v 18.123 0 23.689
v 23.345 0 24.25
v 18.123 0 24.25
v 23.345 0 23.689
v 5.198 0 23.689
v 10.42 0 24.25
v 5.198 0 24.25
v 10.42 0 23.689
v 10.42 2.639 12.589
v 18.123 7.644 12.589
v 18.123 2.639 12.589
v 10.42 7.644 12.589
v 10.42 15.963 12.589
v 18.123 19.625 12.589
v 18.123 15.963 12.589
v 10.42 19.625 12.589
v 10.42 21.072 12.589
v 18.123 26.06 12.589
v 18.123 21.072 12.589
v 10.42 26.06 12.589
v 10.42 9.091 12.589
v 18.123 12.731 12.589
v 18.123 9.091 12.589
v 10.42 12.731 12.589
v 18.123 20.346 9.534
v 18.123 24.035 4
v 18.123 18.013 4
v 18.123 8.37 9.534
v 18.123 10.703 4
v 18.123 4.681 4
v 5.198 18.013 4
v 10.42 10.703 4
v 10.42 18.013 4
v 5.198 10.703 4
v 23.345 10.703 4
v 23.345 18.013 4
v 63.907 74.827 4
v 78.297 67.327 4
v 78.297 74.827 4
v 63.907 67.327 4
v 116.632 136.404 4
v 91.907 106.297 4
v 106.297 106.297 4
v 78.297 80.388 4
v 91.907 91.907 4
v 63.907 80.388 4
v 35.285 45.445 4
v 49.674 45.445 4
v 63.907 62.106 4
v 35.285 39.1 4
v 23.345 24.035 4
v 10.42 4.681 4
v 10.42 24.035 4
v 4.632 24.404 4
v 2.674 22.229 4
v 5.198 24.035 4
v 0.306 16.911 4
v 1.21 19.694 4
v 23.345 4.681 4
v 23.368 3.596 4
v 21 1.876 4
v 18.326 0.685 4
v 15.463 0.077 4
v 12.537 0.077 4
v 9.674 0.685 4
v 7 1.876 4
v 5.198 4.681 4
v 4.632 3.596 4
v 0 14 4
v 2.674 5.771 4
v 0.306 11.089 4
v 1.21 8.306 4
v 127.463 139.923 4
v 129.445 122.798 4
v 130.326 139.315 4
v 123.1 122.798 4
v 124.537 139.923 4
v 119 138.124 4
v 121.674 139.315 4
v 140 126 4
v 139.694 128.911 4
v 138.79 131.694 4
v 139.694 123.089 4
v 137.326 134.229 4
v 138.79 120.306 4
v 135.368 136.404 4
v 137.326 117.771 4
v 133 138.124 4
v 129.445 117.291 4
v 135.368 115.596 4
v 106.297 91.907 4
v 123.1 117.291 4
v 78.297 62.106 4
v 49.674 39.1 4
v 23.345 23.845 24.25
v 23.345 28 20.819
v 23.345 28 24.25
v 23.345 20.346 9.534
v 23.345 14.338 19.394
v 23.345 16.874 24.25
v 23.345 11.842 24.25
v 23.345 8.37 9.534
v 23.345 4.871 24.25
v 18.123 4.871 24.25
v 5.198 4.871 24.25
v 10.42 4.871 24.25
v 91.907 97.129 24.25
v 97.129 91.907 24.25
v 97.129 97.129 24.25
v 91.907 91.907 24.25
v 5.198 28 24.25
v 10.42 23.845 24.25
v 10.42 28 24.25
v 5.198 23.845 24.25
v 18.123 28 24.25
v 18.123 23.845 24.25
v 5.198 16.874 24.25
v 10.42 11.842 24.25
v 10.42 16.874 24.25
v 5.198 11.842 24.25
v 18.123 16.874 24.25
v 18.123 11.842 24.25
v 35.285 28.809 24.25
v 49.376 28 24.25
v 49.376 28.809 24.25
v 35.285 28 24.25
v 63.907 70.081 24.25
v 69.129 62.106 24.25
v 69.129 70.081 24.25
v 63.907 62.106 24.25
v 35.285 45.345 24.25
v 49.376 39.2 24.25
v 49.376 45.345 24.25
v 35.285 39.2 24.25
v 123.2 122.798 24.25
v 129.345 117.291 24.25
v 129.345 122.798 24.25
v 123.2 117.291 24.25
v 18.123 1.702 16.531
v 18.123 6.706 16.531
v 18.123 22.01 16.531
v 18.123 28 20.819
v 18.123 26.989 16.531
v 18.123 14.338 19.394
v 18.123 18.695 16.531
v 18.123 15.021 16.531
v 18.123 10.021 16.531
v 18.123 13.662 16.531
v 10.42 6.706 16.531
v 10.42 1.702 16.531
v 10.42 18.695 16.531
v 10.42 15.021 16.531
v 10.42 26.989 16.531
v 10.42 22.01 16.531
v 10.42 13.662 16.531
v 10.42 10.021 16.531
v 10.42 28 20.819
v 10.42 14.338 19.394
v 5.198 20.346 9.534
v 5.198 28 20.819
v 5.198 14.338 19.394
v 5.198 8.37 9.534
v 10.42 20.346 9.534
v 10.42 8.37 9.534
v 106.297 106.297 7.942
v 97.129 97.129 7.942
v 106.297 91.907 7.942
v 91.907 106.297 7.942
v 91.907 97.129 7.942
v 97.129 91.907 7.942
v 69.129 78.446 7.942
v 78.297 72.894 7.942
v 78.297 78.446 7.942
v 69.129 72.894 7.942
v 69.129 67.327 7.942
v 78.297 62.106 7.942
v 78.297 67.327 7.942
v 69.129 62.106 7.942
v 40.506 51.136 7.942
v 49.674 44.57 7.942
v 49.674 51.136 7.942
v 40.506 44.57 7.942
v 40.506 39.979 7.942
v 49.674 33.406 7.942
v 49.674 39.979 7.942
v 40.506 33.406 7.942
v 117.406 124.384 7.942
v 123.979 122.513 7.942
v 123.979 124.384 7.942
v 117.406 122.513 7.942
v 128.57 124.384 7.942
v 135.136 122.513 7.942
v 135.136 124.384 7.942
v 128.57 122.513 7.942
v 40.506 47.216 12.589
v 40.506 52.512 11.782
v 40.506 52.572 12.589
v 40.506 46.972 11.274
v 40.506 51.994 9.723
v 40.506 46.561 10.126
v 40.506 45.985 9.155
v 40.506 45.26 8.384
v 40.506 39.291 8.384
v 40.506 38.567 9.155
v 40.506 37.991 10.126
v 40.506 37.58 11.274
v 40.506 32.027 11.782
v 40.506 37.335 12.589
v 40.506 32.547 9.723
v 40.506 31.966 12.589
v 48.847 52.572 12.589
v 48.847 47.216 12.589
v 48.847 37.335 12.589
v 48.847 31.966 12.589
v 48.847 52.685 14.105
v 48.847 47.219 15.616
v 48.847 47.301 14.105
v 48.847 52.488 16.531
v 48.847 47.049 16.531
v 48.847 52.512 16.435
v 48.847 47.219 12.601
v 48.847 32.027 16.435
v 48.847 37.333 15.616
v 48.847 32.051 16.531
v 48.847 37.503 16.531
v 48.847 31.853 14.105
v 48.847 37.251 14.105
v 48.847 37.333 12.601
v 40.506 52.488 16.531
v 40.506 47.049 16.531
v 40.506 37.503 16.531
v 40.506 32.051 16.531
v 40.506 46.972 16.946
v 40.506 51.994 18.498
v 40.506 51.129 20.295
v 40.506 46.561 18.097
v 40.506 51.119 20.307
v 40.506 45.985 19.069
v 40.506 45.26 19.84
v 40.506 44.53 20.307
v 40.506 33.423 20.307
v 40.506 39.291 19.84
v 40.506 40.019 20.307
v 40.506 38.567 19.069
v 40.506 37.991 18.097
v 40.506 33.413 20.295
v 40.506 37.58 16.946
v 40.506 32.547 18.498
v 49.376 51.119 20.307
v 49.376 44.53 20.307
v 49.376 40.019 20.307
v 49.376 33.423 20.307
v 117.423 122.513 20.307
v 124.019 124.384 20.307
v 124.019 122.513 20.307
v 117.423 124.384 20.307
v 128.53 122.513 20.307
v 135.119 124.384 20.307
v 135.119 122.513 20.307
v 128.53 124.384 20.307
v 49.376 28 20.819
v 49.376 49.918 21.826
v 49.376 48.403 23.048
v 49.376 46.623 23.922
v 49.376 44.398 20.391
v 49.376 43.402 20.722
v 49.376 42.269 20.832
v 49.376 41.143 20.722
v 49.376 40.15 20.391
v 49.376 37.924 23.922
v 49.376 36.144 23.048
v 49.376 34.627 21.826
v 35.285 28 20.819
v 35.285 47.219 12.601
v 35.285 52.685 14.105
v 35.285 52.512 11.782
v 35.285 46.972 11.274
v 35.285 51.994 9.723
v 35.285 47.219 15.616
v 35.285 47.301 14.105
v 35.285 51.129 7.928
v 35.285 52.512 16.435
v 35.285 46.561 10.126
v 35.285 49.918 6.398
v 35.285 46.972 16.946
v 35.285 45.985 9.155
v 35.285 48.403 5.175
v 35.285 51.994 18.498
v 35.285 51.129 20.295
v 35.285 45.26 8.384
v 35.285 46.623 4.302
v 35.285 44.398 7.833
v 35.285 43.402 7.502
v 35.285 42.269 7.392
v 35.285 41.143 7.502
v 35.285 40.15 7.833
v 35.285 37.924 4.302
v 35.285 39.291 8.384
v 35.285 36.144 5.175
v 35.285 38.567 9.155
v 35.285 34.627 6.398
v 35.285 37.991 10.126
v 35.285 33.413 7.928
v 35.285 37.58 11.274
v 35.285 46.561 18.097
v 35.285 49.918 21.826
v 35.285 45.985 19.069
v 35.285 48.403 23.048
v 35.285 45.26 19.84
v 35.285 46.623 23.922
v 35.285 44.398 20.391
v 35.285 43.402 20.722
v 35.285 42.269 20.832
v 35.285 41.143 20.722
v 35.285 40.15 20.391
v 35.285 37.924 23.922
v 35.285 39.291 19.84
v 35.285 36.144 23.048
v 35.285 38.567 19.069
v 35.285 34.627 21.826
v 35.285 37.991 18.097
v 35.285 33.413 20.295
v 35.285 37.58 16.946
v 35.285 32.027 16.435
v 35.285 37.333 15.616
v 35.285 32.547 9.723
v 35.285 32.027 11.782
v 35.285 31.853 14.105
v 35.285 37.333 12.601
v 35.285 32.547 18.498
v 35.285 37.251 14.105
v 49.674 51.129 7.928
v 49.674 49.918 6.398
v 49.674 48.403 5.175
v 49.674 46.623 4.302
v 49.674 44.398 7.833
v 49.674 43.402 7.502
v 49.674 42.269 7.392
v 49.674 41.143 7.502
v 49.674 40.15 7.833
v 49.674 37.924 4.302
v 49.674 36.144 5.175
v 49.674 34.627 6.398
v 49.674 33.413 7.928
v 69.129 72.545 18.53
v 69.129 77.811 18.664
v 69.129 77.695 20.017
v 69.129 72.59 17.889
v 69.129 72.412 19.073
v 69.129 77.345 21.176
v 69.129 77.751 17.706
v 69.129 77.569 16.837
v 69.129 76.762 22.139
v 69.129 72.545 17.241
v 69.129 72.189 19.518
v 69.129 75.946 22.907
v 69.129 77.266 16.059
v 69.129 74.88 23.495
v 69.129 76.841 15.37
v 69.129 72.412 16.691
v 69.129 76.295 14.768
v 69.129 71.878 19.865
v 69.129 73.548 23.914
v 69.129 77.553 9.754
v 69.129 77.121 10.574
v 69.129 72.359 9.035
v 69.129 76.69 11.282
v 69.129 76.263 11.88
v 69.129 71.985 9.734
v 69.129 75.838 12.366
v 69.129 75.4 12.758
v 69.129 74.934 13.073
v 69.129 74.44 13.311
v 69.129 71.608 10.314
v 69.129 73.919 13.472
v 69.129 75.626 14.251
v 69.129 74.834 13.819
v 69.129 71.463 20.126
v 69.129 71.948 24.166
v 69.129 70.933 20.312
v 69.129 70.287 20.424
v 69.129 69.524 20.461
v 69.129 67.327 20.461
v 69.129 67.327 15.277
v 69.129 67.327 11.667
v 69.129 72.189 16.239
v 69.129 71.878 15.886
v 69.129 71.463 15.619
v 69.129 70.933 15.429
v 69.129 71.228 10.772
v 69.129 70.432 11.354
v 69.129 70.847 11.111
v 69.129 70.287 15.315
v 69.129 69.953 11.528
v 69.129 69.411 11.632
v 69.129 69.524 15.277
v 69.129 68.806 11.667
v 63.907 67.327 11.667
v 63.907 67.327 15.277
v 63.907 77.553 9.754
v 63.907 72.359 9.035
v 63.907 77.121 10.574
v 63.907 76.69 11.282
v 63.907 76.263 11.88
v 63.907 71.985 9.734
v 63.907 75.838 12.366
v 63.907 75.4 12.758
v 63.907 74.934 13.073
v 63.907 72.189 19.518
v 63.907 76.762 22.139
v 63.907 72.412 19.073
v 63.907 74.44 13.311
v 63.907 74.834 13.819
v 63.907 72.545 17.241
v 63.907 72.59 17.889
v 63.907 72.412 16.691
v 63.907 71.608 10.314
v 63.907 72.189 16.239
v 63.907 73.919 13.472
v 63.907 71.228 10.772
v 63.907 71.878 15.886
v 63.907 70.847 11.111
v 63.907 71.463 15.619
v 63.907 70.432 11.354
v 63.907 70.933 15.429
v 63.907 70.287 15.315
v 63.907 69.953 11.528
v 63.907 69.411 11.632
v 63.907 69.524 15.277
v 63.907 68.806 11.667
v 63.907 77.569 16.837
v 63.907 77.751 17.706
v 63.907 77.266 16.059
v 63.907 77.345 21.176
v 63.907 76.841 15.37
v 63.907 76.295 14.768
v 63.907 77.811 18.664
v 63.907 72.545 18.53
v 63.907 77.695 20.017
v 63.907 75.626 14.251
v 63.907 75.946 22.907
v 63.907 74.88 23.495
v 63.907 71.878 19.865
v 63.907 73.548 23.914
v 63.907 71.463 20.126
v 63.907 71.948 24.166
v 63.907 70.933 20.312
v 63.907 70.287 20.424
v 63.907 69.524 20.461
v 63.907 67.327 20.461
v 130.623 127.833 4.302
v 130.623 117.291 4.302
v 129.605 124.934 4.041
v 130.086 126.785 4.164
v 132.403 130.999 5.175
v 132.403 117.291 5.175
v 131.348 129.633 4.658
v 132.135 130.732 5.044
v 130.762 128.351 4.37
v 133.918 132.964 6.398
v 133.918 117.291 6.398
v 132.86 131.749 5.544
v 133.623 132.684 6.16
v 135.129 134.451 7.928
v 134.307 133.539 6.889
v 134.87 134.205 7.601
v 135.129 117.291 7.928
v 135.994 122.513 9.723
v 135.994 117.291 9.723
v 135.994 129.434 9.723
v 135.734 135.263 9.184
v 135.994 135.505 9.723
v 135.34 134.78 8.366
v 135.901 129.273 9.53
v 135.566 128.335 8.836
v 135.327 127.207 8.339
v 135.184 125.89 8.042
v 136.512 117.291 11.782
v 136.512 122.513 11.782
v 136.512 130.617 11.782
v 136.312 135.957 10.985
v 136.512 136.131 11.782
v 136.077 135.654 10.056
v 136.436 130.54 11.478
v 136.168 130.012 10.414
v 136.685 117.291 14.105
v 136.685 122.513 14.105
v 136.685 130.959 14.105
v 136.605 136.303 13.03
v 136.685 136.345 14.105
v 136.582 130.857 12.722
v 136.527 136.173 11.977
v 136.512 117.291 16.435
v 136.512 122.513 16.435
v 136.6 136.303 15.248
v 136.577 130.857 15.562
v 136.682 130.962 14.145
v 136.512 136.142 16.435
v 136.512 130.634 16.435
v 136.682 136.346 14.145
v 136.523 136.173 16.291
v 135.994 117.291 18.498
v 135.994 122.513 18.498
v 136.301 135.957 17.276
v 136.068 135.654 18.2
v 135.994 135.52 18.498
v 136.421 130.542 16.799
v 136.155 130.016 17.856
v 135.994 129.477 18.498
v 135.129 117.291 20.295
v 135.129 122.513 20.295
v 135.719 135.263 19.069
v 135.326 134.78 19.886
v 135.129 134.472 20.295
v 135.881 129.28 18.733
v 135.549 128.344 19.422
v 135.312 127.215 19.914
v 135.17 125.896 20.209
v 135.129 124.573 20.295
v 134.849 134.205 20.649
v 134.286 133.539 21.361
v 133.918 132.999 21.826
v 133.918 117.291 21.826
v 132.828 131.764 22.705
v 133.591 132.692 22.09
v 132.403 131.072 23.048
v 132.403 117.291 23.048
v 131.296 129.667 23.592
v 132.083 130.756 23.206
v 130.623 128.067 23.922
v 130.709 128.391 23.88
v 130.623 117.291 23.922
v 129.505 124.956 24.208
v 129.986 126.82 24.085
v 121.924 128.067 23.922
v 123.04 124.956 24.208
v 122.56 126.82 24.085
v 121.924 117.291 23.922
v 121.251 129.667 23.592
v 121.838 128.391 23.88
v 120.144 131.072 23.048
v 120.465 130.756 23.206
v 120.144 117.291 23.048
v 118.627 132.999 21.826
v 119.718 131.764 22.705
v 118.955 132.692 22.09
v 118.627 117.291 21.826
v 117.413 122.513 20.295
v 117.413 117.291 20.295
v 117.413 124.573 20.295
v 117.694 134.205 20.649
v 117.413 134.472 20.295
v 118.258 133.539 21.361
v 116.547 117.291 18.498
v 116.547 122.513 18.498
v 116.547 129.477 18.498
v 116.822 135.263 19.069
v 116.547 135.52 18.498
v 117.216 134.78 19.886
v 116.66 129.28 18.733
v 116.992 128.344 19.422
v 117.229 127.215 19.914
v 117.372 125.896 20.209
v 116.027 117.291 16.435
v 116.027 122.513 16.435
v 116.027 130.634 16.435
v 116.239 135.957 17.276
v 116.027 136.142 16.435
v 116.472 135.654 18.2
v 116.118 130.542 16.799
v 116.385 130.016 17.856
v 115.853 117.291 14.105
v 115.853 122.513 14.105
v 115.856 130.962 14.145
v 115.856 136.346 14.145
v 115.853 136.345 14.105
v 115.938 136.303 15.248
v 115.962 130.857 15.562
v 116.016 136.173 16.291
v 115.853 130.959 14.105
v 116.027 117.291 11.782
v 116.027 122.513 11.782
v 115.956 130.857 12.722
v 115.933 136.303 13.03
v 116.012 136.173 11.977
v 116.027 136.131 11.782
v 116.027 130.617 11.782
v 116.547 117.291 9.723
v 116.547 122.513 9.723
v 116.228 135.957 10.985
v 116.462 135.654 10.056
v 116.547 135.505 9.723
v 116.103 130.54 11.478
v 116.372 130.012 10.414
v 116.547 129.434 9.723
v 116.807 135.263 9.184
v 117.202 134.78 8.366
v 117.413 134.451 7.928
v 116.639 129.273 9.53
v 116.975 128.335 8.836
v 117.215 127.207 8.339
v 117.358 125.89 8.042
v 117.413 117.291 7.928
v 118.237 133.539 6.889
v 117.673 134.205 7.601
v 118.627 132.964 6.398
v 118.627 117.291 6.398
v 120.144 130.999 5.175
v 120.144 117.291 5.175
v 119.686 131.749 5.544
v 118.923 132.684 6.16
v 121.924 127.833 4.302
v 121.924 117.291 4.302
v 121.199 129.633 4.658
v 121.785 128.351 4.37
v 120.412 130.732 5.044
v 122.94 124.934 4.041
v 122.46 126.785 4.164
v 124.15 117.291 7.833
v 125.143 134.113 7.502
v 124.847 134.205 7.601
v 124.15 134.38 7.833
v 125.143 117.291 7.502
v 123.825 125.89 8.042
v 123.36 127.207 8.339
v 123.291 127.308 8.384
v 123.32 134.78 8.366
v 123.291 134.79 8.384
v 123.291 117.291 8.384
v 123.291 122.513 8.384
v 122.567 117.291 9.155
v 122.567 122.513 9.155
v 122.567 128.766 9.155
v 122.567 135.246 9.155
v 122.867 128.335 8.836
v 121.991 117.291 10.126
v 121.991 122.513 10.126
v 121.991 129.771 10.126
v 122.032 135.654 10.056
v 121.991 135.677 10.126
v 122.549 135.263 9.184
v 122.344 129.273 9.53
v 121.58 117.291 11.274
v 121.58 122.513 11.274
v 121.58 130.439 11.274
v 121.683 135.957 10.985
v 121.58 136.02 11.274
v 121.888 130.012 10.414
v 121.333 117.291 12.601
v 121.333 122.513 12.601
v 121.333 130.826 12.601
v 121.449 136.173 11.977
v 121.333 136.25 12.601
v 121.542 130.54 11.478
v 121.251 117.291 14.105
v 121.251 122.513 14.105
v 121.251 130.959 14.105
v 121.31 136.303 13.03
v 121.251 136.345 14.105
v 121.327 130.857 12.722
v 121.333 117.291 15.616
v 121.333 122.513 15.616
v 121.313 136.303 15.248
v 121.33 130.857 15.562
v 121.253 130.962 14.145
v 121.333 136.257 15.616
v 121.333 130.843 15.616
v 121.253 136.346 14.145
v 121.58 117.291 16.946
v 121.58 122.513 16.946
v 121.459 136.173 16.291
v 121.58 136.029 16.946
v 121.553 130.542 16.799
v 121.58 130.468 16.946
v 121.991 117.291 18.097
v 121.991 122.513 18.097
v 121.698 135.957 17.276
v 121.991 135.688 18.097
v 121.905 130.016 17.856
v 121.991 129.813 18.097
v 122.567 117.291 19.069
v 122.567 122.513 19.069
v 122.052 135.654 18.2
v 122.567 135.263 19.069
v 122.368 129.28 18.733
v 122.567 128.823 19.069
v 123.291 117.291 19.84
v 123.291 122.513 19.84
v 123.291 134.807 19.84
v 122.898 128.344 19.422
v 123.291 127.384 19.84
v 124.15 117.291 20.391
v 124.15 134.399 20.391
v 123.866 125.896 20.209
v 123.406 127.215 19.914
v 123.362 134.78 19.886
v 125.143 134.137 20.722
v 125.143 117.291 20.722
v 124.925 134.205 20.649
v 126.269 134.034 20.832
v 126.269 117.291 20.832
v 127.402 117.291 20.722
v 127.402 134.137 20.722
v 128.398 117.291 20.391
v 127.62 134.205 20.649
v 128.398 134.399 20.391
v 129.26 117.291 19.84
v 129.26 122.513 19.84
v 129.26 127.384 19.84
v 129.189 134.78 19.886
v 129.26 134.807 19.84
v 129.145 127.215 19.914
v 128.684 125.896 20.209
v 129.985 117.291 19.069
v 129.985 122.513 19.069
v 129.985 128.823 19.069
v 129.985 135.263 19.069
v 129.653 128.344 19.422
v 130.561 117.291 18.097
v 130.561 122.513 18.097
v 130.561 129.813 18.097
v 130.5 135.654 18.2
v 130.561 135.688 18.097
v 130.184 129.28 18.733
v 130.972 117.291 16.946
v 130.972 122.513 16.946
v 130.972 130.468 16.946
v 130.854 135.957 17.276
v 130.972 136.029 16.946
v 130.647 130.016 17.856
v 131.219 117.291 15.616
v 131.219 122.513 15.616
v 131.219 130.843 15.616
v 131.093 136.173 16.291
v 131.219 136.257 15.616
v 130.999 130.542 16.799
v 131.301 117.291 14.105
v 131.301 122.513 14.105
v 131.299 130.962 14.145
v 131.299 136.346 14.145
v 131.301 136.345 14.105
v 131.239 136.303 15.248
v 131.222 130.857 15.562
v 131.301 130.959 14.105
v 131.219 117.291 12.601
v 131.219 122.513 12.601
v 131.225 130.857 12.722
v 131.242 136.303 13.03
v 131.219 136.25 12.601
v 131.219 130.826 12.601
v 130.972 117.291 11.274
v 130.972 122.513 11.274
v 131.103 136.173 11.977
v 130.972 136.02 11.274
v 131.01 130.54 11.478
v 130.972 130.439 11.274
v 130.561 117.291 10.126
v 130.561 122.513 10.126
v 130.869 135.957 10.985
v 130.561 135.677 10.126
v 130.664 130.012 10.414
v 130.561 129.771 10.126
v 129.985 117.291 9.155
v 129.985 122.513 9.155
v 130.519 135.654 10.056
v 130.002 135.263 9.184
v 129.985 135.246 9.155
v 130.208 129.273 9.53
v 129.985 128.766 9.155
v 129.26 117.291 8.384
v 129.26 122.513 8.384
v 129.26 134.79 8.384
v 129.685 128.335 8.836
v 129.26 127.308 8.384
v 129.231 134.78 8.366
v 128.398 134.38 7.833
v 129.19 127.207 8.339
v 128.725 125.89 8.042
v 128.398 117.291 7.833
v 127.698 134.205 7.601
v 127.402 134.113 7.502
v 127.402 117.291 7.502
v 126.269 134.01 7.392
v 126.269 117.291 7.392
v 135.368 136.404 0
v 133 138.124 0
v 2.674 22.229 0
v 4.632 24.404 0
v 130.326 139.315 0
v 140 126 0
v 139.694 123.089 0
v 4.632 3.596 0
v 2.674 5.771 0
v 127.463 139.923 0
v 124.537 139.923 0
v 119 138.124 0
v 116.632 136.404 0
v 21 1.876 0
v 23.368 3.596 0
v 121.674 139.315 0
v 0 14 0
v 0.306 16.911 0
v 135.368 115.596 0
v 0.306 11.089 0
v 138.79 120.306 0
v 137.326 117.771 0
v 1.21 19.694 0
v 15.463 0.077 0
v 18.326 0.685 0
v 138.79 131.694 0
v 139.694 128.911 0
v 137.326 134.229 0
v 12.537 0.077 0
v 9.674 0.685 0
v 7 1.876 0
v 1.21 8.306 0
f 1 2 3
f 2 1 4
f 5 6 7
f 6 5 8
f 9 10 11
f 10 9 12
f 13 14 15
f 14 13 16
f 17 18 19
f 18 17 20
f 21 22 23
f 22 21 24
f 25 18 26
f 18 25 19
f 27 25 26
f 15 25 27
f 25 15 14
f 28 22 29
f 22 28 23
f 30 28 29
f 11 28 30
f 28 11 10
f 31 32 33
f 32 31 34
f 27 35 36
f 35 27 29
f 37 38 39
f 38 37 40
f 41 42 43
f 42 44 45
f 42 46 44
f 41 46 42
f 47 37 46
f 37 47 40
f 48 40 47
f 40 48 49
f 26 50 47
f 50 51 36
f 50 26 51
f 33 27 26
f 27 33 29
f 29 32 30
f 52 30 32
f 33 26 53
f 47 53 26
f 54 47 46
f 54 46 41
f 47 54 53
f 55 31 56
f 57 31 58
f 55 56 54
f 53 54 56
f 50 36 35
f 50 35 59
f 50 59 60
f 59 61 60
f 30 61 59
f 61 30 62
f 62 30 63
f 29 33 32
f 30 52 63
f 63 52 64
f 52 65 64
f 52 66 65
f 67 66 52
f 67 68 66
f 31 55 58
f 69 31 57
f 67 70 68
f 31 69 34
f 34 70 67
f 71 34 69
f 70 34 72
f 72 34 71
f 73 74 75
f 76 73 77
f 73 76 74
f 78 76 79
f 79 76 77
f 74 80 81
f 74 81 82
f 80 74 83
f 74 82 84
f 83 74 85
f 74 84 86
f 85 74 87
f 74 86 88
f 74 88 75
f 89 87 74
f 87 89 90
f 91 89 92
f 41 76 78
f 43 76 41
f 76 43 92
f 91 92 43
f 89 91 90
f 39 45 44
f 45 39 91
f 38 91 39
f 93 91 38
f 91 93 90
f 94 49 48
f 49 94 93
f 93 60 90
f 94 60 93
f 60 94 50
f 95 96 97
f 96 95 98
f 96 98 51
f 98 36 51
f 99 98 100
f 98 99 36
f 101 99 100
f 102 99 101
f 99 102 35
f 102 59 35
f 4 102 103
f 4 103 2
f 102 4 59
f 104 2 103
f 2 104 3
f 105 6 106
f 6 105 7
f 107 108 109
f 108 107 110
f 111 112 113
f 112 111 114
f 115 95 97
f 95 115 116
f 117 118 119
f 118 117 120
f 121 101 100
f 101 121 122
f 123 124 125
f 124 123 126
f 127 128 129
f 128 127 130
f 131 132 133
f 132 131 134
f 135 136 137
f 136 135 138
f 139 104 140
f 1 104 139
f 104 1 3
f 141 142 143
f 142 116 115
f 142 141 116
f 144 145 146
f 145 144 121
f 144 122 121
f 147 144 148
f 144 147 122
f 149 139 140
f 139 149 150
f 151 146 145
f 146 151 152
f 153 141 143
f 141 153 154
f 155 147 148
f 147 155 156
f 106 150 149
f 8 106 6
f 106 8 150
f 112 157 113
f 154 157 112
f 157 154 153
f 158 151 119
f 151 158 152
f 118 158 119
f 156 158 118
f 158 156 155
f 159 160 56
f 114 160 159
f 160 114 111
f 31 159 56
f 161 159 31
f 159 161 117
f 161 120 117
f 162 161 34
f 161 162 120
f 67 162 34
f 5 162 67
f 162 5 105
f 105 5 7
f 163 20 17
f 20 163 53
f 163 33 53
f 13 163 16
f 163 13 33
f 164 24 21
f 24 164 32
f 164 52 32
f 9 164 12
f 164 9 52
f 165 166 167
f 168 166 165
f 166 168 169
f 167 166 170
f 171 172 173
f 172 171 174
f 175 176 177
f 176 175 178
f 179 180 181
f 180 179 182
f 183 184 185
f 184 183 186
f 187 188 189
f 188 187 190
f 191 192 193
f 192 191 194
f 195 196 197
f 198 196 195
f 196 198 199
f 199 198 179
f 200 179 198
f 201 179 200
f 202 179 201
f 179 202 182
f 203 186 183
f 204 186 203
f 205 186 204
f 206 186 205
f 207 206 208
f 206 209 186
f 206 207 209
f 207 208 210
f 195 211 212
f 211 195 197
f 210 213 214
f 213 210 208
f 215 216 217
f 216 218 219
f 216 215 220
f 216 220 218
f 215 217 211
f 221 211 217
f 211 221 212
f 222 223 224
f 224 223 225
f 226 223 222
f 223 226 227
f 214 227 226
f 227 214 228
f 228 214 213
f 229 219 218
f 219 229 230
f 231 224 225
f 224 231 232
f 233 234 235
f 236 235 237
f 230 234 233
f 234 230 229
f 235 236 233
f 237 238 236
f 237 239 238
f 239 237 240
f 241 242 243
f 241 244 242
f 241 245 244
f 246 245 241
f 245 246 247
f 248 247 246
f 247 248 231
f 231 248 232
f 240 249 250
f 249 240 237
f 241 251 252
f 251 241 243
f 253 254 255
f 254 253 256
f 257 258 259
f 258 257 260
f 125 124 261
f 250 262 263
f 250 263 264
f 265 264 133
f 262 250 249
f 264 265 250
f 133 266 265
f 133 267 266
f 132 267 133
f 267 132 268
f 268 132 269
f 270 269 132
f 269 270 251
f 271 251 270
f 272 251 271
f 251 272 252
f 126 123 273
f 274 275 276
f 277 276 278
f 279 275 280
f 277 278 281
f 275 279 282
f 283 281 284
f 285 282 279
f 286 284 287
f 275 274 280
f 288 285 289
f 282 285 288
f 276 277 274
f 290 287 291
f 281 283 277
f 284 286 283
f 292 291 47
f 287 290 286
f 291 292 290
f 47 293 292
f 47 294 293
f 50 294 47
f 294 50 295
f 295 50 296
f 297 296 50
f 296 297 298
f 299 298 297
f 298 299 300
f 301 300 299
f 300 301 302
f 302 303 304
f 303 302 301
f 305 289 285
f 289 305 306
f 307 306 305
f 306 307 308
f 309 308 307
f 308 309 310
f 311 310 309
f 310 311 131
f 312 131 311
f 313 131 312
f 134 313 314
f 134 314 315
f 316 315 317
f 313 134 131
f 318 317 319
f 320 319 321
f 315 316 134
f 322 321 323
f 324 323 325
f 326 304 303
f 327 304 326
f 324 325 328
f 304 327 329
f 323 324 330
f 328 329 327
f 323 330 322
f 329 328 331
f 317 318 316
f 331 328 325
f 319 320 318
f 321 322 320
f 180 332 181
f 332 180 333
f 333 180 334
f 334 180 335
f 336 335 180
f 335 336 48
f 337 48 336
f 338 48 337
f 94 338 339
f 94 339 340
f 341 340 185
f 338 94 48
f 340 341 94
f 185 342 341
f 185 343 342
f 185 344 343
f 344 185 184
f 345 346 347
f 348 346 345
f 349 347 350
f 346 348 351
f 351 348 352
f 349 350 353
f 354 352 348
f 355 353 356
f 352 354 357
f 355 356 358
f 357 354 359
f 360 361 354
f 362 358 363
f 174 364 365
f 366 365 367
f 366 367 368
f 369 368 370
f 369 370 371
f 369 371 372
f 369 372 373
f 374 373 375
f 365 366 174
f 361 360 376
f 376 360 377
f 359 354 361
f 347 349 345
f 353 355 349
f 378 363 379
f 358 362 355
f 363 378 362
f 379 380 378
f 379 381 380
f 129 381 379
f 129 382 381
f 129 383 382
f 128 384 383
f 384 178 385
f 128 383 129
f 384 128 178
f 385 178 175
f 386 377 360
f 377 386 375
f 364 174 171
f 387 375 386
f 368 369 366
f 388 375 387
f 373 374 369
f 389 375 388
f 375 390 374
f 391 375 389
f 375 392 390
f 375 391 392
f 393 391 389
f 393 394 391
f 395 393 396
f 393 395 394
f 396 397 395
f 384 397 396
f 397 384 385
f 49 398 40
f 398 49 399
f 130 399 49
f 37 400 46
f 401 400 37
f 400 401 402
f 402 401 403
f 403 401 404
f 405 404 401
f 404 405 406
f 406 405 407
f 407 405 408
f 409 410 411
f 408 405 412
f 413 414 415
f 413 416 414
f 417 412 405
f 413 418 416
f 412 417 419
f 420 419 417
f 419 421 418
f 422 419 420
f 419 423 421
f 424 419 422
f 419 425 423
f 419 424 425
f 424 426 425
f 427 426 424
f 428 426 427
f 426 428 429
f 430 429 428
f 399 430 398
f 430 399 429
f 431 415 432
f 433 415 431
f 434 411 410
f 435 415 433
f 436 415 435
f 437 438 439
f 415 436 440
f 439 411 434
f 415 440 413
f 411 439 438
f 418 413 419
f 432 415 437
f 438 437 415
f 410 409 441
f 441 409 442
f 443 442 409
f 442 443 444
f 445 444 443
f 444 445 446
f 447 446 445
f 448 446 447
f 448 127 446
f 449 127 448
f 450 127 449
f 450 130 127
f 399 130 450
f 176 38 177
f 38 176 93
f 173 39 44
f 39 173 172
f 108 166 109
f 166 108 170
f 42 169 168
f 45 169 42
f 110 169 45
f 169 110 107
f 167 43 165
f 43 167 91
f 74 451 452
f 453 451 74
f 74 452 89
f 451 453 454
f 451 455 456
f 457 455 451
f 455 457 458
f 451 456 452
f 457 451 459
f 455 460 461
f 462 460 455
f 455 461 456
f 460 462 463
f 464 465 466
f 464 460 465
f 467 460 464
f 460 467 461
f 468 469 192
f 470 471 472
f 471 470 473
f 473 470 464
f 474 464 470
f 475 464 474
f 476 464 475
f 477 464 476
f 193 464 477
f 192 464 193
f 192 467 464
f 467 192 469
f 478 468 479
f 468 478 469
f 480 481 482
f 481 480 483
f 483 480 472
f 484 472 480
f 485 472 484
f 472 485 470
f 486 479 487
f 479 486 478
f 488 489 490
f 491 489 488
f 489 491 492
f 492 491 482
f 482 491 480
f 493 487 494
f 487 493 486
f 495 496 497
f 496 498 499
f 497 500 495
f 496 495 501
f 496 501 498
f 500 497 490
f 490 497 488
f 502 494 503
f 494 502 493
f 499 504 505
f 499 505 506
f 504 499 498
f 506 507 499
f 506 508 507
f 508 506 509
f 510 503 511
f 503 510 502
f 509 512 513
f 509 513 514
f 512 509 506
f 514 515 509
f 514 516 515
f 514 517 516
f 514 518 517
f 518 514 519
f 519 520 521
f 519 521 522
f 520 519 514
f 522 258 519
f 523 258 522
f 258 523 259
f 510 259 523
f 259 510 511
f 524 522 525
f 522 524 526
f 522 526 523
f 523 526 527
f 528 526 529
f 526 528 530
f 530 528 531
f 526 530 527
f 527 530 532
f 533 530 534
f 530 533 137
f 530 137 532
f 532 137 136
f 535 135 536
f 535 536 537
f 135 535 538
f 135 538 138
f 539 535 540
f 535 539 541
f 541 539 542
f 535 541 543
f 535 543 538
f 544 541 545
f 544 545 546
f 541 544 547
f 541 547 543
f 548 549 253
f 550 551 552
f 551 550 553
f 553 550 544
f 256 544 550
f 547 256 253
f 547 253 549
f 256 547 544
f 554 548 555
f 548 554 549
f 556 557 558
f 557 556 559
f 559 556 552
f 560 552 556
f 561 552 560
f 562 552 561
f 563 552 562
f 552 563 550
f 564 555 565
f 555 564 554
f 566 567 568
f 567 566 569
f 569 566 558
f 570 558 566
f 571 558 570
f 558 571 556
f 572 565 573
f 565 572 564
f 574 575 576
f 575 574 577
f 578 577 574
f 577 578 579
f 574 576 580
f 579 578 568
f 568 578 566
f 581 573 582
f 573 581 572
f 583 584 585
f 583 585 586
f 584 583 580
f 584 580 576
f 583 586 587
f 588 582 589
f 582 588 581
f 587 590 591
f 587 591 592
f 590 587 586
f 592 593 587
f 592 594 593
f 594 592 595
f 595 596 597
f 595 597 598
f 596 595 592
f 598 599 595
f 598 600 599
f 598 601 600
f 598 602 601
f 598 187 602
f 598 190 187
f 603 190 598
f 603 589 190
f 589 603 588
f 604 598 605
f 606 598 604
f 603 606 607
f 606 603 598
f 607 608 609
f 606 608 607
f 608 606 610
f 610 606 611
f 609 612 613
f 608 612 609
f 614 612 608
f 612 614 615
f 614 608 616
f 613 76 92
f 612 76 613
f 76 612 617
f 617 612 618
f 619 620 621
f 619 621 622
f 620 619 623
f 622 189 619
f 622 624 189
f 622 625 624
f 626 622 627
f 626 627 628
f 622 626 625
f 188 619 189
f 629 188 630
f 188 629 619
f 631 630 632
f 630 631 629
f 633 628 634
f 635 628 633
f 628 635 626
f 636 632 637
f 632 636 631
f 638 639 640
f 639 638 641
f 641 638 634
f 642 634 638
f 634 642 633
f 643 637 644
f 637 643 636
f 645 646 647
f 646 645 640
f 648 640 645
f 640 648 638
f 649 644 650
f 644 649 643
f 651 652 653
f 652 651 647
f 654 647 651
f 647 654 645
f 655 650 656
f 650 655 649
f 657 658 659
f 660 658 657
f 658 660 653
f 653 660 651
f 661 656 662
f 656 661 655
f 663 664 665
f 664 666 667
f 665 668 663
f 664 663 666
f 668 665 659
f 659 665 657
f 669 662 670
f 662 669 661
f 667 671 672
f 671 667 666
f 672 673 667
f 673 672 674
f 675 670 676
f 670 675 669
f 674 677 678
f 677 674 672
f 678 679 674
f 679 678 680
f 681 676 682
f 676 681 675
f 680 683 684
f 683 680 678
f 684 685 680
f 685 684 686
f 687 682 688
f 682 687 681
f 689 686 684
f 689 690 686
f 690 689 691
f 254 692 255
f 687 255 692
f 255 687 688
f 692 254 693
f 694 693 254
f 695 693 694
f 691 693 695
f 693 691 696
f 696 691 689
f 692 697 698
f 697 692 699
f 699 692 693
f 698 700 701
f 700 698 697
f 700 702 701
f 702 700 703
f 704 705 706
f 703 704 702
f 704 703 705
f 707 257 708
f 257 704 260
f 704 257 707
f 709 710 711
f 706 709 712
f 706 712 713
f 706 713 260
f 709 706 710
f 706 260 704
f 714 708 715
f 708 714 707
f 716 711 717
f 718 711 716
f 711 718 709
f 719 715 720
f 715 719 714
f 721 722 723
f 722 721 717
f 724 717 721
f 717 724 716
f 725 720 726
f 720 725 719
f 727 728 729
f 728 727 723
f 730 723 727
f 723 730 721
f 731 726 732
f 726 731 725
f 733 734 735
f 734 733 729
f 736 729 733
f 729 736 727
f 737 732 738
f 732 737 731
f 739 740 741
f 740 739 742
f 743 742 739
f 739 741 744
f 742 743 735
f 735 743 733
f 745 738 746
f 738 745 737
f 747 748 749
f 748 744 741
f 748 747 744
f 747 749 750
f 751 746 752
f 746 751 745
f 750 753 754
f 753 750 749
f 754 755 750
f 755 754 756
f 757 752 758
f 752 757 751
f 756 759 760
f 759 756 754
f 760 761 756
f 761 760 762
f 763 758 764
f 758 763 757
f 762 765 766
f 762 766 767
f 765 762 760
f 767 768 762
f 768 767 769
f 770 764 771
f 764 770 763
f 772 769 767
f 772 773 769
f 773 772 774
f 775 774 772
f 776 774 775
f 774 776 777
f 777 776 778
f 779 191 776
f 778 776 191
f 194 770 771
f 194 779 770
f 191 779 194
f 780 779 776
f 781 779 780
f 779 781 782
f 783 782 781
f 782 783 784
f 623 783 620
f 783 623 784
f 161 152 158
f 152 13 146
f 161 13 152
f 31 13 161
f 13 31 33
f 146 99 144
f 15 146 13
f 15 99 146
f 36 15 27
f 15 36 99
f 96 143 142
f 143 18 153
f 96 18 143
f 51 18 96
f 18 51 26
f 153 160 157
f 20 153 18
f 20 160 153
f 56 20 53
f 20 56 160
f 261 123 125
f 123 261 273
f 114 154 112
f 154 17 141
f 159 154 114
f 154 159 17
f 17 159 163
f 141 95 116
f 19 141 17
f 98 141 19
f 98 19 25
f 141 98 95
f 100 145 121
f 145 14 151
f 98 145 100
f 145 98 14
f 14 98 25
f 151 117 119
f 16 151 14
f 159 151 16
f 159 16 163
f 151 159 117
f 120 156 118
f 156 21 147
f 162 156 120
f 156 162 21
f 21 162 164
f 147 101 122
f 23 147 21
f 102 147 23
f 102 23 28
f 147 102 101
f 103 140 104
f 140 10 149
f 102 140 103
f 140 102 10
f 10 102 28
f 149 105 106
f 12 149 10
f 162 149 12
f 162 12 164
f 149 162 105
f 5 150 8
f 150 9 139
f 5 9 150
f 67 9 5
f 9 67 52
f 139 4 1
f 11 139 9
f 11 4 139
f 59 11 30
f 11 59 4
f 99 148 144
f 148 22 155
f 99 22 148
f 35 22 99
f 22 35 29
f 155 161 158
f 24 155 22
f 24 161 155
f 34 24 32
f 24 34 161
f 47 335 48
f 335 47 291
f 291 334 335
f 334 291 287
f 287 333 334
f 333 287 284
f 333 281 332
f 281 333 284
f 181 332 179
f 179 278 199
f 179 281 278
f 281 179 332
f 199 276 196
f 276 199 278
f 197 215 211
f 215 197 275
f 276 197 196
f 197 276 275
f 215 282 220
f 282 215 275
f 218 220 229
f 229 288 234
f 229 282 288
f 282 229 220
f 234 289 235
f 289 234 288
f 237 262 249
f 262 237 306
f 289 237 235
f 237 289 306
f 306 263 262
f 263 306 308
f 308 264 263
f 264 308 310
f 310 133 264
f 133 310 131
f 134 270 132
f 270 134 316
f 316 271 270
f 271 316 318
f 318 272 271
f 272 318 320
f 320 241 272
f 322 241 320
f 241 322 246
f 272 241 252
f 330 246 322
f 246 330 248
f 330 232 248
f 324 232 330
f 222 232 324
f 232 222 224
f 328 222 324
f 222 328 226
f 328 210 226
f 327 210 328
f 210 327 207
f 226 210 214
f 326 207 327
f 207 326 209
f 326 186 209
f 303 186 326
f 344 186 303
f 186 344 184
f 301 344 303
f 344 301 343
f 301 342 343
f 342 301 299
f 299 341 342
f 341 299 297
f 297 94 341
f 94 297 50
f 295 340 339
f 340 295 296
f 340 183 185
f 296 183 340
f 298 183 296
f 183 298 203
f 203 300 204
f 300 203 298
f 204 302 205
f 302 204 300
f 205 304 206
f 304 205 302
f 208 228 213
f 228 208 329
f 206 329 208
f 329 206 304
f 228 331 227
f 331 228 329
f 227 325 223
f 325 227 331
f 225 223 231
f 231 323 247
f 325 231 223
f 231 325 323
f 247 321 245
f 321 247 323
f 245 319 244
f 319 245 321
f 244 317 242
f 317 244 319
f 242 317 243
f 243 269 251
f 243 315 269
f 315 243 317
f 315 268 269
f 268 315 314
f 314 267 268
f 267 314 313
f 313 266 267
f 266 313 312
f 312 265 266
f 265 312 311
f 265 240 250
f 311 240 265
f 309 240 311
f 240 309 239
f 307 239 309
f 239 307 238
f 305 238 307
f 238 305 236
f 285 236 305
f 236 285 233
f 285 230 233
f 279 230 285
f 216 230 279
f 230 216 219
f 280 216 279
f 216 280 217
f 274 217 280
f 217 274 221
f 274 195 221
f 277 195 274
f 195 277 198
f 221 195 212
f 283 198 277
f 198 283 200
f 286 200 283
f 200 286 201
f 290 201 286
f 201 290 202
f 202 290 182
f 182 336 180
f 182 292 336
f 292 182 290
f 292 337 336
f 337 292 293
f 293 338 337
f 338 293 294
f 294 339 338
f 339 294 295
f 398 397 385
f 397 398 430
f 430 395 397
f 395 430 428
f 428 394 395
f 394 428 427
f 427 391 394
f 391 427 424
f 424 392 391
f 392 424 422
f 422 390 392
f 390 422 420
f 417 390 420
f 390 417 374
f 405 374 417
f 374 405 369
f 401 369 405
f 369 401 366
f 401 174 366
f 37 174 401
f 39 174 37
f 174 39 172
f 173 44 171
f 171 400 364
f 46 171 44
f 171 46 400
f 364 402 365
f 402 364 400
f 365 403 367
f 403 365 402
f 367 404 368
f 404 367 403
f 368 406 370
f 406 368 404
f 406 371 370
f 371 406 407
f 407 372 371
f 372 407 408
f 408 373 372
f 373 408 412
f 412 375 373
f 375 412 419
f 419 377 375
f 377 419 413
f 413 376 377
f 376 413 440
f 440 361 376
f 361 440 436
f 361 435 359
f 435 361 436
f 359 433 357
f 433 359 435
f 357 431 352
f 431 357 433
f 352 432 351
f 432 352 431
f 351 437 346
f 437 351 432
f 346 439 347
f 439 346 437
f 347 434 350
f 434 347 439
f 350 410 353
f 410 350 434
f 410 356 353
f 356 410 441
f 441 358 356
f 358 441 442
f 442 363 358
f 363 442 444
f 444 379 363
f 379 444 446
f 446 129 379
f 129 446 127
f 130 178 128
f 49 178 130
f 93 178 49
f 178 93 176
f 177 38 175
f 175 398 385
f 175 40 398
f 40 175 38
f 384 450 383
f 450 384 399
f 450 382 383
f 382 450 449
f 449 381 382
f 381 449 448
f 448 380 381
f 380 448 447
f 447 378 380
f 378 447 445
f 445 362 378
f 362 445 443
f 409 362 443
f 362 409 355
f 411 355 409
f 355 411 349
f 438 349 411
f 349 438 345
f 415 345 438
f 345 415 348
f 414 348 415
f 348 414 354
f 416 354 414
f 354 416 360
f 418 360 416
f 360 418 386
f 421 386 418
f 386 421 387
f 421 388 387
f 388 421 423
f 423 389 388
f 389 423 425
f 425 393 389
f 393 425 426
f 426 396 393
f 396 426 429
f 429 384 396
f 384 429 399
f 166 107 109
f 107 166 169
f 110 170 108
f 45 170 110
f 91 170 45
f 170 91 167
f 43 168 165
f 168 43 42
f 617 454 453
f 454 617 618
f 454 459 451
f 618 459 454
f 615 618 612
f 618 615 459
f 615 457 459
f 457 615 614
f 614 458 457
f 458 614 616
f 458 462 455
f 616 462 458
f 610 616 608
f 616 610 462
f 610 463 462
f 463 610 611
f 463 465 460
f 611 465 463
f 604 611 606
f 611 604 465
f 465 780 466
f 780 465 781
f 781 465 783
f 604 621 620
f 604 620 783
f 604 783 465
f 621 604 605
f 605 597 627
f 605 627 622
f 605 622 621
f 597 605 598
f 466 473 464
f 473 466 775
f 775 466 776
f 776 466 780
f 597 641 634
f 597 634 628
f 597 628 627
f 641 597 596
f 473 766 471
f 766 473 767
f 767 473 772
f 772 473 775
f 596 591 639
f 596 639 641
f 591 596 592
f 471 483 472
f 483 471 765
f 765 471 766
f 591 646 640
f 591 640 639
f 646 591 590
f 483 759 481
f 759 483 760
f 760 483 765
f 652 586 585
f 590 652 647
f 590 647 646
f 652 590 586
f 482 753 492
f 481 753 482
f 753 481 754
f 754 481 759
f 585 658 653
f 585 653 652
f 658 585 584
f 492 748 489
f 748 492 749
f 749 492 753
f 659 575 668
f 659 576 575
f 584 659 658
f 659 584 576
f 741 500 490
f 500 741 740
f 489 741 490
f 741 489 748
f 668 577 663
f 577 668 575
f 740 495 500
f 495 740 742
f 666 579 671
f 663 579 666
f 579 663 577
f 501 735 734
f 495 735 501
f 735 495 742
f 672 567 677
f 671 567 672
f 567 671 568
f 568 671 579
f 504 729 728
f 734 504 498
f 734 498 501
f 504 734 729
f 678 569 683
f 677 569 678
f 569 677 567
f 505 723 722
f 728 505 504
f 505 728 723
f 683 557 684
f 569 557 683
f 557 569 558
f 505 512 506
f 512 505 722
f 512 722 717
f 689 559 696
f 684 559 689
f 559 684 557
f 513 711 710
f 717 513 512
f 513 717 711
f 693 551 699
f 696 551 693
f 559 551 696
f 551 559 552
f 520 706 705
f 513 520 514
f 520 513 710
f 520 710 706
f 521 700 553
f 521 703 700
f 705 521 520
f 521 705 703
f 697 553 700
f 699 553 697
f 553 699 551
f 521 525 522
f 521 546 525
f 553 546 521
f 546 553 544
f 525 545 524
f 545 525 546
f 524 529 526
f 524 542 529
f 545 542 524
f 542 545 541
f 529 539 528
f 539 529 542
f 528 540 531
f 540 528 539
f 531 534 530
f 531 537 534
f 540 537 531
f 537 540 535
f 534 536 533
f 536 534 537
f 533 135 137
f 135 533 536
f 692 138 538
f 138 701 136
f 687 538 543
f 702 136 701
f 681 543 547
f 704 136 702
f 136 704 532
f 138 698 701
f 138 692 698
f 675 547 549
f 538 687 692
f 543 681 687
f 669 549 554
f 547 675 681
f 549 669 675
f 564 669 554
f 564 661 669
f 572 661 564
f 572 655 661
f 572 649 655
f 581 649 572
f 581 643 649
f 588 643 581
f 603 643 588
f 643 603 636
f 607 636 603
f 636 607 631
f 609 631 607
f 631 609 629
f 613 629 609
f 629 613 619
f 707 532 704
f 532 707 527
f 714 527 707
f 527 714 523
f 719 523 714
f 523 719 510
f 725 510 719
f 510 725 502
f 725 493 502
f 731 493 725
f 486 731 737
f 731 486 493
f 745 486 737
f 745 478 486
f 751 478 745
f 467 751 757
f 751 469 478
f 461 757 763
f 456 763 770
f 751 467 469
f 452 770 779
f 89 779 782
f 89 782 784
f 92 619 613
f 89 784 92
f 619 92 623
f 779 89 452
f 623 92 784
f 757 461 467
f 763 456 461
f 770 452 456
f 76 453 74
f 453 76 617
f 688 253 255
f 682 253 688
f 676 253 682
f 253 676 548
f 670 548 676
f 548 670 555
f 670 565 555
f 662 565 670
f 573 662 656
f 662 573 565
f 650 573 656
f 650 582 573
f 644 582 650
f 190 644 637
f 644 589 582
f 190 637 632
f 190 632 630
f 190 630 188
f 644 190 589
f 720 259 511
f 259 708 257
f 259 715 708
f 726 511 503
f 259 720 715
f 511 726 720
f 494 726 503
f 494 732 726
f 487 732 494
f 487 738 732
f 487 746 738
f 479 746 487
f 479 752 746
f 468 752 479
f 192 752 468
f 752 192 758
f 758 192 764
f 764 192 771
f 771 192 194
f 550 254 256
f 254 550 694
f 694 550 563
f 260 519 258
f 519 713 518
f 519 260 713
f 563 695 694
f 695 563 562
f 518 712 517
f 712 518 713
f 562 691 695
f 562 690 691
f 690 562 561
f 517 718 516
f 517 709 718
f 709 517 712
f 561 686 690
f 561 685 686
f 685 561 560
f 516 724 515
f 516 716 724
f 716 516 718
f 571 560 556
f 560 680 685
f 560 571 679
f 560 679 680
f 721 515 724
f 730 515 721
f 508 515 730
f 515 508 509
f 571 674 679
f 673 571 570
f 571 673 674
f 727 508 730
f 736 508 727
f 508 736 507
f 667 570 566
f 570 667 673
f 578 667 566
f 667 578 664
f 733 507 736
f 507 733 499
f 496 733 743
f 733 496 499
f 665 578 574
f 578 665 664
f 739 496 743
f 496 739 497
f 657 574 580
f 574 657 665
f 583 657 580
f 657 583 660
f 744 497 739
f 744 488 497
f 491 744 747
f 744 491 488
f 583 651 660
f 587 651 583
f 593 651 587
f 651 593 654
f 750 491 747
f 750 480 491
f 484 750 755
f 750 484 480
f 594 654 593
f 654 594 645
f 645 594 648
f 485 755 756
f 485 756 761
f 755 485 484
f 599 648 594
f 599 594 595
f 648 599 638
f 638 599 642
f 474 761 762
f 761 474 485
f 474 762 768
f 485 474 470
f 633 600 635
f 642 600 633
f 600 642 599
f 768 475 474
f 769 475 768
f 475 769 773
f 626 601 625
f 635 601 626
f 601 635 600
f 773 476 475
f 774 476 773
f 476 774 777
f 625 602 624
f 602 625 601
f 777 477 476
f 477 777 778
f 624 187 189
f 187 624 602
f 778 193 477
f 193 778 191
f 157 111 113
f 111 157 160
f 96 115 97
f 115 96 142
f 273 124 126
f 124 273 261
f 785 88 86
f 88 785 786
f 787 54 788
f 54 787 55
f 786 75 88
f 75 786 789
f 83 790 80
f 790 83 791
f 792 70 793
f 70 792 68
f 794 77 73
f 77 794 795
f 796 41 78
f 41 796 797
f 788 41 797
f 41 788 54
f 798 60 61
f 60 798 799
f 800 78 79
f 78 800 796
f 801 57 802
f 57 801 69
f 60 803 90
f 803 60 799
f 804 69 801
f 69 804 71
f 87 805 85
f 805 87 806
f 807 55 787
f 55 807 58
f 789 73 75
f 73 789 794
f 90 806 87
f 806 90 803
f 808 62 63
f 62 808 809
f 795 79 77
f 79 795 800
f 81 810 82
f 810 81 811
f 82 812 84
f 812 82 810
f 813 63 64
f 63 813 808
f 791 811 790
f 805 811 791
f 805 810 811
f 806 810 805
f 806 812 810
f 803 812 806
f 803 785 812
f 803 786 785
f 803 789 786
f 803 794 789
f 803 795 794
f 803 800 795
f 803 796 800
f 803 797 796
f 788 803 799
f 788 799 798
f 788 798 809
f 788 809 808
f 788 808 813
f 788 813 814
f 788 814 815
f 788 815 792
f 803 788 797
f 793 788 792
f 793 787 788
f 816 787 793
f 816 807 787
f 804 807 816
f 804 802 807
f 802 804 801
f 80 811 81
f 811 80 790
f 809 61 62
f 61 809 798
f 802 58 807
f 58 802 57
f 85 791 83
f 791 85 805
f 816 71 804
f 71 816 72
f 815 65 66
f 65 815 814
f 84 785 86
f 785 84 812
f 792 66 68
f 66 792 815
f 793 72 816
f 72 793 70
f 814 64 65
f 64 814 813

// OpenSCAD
text_1 = "HELLO";

text_2 = "WORLD";

font_size = 20;

//size of the space between letters
font_spacing = 8;

font = "Source Code Pro:style=Bold";

build_base = "yes"; //[yes,no]

base_type = "circle"; //[circle,square]

union() {
    length = max(len(text_1), len(text_2));    
    base_offset = build_base == "yes" ? font_size / 5 : 0;
    
    // generate letters
    translate([0, 0, base_offset]) intersection() {
        
        // generate letter extrusions for first text
        translate([0, (font_spacing + font_size) * length, 0]) rotate([90, 0, 0]) {
            for (i = [0 : len(text_1) - 1]) {
                linear_extrude(height = (font_spacing + font_size) * length) // extrude the letters
                    translate([(font_size + font_spacing) * (i + 0.5), 0, 0]) // shift half the total allocated space
                    text(text_1[i], size = font_size, font = font, halign = "center");
            }
        }
        
        // generate letter extrusions for second text
        rotate([90, 0, 90]) {
            for (i = [0 : len(text_2) - 1]) {
                linear_extrude(height = (font_spacing + font_size) * length) // extrude the letters
                    translate([(font_size + font_spacing) * (i + 0.5), 0, 0]) // shift half the total allocated space
                    text(text_2[i], size = font_size, font = font, halign = "center");
            }
        }

        // generate cubes around desired letters
        for (i = [0 : length - 1]) {
            translate([(font_size + font_spacing) * i, (font_size + font_spacing) * i, 0]) 
                cube(font_size + font_spacing);
        }

    }

    //generate base
    if (build_base == "yes") {
        hull() {
            translate([(font_size + font_spacing) * (0.5), (font_size + font_spacing) * (0.5), font_size / 5 * (0.5)])
                if (base_type == "circle") {
                    cylinder(h = font_size / 5, r = (font_size + font_spacing) / 2, center = true);
                } else {
                    cube([font_size + font_spacing, font_size + font_spacing, font_size / 5], center = true);
                }
            translate([(font_size + font_spacing) * (length - 0.5), (font_size + font_spacing) * (length - 0.5), font_size / 5 * (0.5)])
                if (base_type == "circle") {
                    cylinder(h = font_size / 5, r = (font_size + font_spacing) / 2, center = true);
                } else {
                    cube([font_size + font_spacing, font_size + font_spacing, font_size / 5], center = true);
                }
        }
    }
}
